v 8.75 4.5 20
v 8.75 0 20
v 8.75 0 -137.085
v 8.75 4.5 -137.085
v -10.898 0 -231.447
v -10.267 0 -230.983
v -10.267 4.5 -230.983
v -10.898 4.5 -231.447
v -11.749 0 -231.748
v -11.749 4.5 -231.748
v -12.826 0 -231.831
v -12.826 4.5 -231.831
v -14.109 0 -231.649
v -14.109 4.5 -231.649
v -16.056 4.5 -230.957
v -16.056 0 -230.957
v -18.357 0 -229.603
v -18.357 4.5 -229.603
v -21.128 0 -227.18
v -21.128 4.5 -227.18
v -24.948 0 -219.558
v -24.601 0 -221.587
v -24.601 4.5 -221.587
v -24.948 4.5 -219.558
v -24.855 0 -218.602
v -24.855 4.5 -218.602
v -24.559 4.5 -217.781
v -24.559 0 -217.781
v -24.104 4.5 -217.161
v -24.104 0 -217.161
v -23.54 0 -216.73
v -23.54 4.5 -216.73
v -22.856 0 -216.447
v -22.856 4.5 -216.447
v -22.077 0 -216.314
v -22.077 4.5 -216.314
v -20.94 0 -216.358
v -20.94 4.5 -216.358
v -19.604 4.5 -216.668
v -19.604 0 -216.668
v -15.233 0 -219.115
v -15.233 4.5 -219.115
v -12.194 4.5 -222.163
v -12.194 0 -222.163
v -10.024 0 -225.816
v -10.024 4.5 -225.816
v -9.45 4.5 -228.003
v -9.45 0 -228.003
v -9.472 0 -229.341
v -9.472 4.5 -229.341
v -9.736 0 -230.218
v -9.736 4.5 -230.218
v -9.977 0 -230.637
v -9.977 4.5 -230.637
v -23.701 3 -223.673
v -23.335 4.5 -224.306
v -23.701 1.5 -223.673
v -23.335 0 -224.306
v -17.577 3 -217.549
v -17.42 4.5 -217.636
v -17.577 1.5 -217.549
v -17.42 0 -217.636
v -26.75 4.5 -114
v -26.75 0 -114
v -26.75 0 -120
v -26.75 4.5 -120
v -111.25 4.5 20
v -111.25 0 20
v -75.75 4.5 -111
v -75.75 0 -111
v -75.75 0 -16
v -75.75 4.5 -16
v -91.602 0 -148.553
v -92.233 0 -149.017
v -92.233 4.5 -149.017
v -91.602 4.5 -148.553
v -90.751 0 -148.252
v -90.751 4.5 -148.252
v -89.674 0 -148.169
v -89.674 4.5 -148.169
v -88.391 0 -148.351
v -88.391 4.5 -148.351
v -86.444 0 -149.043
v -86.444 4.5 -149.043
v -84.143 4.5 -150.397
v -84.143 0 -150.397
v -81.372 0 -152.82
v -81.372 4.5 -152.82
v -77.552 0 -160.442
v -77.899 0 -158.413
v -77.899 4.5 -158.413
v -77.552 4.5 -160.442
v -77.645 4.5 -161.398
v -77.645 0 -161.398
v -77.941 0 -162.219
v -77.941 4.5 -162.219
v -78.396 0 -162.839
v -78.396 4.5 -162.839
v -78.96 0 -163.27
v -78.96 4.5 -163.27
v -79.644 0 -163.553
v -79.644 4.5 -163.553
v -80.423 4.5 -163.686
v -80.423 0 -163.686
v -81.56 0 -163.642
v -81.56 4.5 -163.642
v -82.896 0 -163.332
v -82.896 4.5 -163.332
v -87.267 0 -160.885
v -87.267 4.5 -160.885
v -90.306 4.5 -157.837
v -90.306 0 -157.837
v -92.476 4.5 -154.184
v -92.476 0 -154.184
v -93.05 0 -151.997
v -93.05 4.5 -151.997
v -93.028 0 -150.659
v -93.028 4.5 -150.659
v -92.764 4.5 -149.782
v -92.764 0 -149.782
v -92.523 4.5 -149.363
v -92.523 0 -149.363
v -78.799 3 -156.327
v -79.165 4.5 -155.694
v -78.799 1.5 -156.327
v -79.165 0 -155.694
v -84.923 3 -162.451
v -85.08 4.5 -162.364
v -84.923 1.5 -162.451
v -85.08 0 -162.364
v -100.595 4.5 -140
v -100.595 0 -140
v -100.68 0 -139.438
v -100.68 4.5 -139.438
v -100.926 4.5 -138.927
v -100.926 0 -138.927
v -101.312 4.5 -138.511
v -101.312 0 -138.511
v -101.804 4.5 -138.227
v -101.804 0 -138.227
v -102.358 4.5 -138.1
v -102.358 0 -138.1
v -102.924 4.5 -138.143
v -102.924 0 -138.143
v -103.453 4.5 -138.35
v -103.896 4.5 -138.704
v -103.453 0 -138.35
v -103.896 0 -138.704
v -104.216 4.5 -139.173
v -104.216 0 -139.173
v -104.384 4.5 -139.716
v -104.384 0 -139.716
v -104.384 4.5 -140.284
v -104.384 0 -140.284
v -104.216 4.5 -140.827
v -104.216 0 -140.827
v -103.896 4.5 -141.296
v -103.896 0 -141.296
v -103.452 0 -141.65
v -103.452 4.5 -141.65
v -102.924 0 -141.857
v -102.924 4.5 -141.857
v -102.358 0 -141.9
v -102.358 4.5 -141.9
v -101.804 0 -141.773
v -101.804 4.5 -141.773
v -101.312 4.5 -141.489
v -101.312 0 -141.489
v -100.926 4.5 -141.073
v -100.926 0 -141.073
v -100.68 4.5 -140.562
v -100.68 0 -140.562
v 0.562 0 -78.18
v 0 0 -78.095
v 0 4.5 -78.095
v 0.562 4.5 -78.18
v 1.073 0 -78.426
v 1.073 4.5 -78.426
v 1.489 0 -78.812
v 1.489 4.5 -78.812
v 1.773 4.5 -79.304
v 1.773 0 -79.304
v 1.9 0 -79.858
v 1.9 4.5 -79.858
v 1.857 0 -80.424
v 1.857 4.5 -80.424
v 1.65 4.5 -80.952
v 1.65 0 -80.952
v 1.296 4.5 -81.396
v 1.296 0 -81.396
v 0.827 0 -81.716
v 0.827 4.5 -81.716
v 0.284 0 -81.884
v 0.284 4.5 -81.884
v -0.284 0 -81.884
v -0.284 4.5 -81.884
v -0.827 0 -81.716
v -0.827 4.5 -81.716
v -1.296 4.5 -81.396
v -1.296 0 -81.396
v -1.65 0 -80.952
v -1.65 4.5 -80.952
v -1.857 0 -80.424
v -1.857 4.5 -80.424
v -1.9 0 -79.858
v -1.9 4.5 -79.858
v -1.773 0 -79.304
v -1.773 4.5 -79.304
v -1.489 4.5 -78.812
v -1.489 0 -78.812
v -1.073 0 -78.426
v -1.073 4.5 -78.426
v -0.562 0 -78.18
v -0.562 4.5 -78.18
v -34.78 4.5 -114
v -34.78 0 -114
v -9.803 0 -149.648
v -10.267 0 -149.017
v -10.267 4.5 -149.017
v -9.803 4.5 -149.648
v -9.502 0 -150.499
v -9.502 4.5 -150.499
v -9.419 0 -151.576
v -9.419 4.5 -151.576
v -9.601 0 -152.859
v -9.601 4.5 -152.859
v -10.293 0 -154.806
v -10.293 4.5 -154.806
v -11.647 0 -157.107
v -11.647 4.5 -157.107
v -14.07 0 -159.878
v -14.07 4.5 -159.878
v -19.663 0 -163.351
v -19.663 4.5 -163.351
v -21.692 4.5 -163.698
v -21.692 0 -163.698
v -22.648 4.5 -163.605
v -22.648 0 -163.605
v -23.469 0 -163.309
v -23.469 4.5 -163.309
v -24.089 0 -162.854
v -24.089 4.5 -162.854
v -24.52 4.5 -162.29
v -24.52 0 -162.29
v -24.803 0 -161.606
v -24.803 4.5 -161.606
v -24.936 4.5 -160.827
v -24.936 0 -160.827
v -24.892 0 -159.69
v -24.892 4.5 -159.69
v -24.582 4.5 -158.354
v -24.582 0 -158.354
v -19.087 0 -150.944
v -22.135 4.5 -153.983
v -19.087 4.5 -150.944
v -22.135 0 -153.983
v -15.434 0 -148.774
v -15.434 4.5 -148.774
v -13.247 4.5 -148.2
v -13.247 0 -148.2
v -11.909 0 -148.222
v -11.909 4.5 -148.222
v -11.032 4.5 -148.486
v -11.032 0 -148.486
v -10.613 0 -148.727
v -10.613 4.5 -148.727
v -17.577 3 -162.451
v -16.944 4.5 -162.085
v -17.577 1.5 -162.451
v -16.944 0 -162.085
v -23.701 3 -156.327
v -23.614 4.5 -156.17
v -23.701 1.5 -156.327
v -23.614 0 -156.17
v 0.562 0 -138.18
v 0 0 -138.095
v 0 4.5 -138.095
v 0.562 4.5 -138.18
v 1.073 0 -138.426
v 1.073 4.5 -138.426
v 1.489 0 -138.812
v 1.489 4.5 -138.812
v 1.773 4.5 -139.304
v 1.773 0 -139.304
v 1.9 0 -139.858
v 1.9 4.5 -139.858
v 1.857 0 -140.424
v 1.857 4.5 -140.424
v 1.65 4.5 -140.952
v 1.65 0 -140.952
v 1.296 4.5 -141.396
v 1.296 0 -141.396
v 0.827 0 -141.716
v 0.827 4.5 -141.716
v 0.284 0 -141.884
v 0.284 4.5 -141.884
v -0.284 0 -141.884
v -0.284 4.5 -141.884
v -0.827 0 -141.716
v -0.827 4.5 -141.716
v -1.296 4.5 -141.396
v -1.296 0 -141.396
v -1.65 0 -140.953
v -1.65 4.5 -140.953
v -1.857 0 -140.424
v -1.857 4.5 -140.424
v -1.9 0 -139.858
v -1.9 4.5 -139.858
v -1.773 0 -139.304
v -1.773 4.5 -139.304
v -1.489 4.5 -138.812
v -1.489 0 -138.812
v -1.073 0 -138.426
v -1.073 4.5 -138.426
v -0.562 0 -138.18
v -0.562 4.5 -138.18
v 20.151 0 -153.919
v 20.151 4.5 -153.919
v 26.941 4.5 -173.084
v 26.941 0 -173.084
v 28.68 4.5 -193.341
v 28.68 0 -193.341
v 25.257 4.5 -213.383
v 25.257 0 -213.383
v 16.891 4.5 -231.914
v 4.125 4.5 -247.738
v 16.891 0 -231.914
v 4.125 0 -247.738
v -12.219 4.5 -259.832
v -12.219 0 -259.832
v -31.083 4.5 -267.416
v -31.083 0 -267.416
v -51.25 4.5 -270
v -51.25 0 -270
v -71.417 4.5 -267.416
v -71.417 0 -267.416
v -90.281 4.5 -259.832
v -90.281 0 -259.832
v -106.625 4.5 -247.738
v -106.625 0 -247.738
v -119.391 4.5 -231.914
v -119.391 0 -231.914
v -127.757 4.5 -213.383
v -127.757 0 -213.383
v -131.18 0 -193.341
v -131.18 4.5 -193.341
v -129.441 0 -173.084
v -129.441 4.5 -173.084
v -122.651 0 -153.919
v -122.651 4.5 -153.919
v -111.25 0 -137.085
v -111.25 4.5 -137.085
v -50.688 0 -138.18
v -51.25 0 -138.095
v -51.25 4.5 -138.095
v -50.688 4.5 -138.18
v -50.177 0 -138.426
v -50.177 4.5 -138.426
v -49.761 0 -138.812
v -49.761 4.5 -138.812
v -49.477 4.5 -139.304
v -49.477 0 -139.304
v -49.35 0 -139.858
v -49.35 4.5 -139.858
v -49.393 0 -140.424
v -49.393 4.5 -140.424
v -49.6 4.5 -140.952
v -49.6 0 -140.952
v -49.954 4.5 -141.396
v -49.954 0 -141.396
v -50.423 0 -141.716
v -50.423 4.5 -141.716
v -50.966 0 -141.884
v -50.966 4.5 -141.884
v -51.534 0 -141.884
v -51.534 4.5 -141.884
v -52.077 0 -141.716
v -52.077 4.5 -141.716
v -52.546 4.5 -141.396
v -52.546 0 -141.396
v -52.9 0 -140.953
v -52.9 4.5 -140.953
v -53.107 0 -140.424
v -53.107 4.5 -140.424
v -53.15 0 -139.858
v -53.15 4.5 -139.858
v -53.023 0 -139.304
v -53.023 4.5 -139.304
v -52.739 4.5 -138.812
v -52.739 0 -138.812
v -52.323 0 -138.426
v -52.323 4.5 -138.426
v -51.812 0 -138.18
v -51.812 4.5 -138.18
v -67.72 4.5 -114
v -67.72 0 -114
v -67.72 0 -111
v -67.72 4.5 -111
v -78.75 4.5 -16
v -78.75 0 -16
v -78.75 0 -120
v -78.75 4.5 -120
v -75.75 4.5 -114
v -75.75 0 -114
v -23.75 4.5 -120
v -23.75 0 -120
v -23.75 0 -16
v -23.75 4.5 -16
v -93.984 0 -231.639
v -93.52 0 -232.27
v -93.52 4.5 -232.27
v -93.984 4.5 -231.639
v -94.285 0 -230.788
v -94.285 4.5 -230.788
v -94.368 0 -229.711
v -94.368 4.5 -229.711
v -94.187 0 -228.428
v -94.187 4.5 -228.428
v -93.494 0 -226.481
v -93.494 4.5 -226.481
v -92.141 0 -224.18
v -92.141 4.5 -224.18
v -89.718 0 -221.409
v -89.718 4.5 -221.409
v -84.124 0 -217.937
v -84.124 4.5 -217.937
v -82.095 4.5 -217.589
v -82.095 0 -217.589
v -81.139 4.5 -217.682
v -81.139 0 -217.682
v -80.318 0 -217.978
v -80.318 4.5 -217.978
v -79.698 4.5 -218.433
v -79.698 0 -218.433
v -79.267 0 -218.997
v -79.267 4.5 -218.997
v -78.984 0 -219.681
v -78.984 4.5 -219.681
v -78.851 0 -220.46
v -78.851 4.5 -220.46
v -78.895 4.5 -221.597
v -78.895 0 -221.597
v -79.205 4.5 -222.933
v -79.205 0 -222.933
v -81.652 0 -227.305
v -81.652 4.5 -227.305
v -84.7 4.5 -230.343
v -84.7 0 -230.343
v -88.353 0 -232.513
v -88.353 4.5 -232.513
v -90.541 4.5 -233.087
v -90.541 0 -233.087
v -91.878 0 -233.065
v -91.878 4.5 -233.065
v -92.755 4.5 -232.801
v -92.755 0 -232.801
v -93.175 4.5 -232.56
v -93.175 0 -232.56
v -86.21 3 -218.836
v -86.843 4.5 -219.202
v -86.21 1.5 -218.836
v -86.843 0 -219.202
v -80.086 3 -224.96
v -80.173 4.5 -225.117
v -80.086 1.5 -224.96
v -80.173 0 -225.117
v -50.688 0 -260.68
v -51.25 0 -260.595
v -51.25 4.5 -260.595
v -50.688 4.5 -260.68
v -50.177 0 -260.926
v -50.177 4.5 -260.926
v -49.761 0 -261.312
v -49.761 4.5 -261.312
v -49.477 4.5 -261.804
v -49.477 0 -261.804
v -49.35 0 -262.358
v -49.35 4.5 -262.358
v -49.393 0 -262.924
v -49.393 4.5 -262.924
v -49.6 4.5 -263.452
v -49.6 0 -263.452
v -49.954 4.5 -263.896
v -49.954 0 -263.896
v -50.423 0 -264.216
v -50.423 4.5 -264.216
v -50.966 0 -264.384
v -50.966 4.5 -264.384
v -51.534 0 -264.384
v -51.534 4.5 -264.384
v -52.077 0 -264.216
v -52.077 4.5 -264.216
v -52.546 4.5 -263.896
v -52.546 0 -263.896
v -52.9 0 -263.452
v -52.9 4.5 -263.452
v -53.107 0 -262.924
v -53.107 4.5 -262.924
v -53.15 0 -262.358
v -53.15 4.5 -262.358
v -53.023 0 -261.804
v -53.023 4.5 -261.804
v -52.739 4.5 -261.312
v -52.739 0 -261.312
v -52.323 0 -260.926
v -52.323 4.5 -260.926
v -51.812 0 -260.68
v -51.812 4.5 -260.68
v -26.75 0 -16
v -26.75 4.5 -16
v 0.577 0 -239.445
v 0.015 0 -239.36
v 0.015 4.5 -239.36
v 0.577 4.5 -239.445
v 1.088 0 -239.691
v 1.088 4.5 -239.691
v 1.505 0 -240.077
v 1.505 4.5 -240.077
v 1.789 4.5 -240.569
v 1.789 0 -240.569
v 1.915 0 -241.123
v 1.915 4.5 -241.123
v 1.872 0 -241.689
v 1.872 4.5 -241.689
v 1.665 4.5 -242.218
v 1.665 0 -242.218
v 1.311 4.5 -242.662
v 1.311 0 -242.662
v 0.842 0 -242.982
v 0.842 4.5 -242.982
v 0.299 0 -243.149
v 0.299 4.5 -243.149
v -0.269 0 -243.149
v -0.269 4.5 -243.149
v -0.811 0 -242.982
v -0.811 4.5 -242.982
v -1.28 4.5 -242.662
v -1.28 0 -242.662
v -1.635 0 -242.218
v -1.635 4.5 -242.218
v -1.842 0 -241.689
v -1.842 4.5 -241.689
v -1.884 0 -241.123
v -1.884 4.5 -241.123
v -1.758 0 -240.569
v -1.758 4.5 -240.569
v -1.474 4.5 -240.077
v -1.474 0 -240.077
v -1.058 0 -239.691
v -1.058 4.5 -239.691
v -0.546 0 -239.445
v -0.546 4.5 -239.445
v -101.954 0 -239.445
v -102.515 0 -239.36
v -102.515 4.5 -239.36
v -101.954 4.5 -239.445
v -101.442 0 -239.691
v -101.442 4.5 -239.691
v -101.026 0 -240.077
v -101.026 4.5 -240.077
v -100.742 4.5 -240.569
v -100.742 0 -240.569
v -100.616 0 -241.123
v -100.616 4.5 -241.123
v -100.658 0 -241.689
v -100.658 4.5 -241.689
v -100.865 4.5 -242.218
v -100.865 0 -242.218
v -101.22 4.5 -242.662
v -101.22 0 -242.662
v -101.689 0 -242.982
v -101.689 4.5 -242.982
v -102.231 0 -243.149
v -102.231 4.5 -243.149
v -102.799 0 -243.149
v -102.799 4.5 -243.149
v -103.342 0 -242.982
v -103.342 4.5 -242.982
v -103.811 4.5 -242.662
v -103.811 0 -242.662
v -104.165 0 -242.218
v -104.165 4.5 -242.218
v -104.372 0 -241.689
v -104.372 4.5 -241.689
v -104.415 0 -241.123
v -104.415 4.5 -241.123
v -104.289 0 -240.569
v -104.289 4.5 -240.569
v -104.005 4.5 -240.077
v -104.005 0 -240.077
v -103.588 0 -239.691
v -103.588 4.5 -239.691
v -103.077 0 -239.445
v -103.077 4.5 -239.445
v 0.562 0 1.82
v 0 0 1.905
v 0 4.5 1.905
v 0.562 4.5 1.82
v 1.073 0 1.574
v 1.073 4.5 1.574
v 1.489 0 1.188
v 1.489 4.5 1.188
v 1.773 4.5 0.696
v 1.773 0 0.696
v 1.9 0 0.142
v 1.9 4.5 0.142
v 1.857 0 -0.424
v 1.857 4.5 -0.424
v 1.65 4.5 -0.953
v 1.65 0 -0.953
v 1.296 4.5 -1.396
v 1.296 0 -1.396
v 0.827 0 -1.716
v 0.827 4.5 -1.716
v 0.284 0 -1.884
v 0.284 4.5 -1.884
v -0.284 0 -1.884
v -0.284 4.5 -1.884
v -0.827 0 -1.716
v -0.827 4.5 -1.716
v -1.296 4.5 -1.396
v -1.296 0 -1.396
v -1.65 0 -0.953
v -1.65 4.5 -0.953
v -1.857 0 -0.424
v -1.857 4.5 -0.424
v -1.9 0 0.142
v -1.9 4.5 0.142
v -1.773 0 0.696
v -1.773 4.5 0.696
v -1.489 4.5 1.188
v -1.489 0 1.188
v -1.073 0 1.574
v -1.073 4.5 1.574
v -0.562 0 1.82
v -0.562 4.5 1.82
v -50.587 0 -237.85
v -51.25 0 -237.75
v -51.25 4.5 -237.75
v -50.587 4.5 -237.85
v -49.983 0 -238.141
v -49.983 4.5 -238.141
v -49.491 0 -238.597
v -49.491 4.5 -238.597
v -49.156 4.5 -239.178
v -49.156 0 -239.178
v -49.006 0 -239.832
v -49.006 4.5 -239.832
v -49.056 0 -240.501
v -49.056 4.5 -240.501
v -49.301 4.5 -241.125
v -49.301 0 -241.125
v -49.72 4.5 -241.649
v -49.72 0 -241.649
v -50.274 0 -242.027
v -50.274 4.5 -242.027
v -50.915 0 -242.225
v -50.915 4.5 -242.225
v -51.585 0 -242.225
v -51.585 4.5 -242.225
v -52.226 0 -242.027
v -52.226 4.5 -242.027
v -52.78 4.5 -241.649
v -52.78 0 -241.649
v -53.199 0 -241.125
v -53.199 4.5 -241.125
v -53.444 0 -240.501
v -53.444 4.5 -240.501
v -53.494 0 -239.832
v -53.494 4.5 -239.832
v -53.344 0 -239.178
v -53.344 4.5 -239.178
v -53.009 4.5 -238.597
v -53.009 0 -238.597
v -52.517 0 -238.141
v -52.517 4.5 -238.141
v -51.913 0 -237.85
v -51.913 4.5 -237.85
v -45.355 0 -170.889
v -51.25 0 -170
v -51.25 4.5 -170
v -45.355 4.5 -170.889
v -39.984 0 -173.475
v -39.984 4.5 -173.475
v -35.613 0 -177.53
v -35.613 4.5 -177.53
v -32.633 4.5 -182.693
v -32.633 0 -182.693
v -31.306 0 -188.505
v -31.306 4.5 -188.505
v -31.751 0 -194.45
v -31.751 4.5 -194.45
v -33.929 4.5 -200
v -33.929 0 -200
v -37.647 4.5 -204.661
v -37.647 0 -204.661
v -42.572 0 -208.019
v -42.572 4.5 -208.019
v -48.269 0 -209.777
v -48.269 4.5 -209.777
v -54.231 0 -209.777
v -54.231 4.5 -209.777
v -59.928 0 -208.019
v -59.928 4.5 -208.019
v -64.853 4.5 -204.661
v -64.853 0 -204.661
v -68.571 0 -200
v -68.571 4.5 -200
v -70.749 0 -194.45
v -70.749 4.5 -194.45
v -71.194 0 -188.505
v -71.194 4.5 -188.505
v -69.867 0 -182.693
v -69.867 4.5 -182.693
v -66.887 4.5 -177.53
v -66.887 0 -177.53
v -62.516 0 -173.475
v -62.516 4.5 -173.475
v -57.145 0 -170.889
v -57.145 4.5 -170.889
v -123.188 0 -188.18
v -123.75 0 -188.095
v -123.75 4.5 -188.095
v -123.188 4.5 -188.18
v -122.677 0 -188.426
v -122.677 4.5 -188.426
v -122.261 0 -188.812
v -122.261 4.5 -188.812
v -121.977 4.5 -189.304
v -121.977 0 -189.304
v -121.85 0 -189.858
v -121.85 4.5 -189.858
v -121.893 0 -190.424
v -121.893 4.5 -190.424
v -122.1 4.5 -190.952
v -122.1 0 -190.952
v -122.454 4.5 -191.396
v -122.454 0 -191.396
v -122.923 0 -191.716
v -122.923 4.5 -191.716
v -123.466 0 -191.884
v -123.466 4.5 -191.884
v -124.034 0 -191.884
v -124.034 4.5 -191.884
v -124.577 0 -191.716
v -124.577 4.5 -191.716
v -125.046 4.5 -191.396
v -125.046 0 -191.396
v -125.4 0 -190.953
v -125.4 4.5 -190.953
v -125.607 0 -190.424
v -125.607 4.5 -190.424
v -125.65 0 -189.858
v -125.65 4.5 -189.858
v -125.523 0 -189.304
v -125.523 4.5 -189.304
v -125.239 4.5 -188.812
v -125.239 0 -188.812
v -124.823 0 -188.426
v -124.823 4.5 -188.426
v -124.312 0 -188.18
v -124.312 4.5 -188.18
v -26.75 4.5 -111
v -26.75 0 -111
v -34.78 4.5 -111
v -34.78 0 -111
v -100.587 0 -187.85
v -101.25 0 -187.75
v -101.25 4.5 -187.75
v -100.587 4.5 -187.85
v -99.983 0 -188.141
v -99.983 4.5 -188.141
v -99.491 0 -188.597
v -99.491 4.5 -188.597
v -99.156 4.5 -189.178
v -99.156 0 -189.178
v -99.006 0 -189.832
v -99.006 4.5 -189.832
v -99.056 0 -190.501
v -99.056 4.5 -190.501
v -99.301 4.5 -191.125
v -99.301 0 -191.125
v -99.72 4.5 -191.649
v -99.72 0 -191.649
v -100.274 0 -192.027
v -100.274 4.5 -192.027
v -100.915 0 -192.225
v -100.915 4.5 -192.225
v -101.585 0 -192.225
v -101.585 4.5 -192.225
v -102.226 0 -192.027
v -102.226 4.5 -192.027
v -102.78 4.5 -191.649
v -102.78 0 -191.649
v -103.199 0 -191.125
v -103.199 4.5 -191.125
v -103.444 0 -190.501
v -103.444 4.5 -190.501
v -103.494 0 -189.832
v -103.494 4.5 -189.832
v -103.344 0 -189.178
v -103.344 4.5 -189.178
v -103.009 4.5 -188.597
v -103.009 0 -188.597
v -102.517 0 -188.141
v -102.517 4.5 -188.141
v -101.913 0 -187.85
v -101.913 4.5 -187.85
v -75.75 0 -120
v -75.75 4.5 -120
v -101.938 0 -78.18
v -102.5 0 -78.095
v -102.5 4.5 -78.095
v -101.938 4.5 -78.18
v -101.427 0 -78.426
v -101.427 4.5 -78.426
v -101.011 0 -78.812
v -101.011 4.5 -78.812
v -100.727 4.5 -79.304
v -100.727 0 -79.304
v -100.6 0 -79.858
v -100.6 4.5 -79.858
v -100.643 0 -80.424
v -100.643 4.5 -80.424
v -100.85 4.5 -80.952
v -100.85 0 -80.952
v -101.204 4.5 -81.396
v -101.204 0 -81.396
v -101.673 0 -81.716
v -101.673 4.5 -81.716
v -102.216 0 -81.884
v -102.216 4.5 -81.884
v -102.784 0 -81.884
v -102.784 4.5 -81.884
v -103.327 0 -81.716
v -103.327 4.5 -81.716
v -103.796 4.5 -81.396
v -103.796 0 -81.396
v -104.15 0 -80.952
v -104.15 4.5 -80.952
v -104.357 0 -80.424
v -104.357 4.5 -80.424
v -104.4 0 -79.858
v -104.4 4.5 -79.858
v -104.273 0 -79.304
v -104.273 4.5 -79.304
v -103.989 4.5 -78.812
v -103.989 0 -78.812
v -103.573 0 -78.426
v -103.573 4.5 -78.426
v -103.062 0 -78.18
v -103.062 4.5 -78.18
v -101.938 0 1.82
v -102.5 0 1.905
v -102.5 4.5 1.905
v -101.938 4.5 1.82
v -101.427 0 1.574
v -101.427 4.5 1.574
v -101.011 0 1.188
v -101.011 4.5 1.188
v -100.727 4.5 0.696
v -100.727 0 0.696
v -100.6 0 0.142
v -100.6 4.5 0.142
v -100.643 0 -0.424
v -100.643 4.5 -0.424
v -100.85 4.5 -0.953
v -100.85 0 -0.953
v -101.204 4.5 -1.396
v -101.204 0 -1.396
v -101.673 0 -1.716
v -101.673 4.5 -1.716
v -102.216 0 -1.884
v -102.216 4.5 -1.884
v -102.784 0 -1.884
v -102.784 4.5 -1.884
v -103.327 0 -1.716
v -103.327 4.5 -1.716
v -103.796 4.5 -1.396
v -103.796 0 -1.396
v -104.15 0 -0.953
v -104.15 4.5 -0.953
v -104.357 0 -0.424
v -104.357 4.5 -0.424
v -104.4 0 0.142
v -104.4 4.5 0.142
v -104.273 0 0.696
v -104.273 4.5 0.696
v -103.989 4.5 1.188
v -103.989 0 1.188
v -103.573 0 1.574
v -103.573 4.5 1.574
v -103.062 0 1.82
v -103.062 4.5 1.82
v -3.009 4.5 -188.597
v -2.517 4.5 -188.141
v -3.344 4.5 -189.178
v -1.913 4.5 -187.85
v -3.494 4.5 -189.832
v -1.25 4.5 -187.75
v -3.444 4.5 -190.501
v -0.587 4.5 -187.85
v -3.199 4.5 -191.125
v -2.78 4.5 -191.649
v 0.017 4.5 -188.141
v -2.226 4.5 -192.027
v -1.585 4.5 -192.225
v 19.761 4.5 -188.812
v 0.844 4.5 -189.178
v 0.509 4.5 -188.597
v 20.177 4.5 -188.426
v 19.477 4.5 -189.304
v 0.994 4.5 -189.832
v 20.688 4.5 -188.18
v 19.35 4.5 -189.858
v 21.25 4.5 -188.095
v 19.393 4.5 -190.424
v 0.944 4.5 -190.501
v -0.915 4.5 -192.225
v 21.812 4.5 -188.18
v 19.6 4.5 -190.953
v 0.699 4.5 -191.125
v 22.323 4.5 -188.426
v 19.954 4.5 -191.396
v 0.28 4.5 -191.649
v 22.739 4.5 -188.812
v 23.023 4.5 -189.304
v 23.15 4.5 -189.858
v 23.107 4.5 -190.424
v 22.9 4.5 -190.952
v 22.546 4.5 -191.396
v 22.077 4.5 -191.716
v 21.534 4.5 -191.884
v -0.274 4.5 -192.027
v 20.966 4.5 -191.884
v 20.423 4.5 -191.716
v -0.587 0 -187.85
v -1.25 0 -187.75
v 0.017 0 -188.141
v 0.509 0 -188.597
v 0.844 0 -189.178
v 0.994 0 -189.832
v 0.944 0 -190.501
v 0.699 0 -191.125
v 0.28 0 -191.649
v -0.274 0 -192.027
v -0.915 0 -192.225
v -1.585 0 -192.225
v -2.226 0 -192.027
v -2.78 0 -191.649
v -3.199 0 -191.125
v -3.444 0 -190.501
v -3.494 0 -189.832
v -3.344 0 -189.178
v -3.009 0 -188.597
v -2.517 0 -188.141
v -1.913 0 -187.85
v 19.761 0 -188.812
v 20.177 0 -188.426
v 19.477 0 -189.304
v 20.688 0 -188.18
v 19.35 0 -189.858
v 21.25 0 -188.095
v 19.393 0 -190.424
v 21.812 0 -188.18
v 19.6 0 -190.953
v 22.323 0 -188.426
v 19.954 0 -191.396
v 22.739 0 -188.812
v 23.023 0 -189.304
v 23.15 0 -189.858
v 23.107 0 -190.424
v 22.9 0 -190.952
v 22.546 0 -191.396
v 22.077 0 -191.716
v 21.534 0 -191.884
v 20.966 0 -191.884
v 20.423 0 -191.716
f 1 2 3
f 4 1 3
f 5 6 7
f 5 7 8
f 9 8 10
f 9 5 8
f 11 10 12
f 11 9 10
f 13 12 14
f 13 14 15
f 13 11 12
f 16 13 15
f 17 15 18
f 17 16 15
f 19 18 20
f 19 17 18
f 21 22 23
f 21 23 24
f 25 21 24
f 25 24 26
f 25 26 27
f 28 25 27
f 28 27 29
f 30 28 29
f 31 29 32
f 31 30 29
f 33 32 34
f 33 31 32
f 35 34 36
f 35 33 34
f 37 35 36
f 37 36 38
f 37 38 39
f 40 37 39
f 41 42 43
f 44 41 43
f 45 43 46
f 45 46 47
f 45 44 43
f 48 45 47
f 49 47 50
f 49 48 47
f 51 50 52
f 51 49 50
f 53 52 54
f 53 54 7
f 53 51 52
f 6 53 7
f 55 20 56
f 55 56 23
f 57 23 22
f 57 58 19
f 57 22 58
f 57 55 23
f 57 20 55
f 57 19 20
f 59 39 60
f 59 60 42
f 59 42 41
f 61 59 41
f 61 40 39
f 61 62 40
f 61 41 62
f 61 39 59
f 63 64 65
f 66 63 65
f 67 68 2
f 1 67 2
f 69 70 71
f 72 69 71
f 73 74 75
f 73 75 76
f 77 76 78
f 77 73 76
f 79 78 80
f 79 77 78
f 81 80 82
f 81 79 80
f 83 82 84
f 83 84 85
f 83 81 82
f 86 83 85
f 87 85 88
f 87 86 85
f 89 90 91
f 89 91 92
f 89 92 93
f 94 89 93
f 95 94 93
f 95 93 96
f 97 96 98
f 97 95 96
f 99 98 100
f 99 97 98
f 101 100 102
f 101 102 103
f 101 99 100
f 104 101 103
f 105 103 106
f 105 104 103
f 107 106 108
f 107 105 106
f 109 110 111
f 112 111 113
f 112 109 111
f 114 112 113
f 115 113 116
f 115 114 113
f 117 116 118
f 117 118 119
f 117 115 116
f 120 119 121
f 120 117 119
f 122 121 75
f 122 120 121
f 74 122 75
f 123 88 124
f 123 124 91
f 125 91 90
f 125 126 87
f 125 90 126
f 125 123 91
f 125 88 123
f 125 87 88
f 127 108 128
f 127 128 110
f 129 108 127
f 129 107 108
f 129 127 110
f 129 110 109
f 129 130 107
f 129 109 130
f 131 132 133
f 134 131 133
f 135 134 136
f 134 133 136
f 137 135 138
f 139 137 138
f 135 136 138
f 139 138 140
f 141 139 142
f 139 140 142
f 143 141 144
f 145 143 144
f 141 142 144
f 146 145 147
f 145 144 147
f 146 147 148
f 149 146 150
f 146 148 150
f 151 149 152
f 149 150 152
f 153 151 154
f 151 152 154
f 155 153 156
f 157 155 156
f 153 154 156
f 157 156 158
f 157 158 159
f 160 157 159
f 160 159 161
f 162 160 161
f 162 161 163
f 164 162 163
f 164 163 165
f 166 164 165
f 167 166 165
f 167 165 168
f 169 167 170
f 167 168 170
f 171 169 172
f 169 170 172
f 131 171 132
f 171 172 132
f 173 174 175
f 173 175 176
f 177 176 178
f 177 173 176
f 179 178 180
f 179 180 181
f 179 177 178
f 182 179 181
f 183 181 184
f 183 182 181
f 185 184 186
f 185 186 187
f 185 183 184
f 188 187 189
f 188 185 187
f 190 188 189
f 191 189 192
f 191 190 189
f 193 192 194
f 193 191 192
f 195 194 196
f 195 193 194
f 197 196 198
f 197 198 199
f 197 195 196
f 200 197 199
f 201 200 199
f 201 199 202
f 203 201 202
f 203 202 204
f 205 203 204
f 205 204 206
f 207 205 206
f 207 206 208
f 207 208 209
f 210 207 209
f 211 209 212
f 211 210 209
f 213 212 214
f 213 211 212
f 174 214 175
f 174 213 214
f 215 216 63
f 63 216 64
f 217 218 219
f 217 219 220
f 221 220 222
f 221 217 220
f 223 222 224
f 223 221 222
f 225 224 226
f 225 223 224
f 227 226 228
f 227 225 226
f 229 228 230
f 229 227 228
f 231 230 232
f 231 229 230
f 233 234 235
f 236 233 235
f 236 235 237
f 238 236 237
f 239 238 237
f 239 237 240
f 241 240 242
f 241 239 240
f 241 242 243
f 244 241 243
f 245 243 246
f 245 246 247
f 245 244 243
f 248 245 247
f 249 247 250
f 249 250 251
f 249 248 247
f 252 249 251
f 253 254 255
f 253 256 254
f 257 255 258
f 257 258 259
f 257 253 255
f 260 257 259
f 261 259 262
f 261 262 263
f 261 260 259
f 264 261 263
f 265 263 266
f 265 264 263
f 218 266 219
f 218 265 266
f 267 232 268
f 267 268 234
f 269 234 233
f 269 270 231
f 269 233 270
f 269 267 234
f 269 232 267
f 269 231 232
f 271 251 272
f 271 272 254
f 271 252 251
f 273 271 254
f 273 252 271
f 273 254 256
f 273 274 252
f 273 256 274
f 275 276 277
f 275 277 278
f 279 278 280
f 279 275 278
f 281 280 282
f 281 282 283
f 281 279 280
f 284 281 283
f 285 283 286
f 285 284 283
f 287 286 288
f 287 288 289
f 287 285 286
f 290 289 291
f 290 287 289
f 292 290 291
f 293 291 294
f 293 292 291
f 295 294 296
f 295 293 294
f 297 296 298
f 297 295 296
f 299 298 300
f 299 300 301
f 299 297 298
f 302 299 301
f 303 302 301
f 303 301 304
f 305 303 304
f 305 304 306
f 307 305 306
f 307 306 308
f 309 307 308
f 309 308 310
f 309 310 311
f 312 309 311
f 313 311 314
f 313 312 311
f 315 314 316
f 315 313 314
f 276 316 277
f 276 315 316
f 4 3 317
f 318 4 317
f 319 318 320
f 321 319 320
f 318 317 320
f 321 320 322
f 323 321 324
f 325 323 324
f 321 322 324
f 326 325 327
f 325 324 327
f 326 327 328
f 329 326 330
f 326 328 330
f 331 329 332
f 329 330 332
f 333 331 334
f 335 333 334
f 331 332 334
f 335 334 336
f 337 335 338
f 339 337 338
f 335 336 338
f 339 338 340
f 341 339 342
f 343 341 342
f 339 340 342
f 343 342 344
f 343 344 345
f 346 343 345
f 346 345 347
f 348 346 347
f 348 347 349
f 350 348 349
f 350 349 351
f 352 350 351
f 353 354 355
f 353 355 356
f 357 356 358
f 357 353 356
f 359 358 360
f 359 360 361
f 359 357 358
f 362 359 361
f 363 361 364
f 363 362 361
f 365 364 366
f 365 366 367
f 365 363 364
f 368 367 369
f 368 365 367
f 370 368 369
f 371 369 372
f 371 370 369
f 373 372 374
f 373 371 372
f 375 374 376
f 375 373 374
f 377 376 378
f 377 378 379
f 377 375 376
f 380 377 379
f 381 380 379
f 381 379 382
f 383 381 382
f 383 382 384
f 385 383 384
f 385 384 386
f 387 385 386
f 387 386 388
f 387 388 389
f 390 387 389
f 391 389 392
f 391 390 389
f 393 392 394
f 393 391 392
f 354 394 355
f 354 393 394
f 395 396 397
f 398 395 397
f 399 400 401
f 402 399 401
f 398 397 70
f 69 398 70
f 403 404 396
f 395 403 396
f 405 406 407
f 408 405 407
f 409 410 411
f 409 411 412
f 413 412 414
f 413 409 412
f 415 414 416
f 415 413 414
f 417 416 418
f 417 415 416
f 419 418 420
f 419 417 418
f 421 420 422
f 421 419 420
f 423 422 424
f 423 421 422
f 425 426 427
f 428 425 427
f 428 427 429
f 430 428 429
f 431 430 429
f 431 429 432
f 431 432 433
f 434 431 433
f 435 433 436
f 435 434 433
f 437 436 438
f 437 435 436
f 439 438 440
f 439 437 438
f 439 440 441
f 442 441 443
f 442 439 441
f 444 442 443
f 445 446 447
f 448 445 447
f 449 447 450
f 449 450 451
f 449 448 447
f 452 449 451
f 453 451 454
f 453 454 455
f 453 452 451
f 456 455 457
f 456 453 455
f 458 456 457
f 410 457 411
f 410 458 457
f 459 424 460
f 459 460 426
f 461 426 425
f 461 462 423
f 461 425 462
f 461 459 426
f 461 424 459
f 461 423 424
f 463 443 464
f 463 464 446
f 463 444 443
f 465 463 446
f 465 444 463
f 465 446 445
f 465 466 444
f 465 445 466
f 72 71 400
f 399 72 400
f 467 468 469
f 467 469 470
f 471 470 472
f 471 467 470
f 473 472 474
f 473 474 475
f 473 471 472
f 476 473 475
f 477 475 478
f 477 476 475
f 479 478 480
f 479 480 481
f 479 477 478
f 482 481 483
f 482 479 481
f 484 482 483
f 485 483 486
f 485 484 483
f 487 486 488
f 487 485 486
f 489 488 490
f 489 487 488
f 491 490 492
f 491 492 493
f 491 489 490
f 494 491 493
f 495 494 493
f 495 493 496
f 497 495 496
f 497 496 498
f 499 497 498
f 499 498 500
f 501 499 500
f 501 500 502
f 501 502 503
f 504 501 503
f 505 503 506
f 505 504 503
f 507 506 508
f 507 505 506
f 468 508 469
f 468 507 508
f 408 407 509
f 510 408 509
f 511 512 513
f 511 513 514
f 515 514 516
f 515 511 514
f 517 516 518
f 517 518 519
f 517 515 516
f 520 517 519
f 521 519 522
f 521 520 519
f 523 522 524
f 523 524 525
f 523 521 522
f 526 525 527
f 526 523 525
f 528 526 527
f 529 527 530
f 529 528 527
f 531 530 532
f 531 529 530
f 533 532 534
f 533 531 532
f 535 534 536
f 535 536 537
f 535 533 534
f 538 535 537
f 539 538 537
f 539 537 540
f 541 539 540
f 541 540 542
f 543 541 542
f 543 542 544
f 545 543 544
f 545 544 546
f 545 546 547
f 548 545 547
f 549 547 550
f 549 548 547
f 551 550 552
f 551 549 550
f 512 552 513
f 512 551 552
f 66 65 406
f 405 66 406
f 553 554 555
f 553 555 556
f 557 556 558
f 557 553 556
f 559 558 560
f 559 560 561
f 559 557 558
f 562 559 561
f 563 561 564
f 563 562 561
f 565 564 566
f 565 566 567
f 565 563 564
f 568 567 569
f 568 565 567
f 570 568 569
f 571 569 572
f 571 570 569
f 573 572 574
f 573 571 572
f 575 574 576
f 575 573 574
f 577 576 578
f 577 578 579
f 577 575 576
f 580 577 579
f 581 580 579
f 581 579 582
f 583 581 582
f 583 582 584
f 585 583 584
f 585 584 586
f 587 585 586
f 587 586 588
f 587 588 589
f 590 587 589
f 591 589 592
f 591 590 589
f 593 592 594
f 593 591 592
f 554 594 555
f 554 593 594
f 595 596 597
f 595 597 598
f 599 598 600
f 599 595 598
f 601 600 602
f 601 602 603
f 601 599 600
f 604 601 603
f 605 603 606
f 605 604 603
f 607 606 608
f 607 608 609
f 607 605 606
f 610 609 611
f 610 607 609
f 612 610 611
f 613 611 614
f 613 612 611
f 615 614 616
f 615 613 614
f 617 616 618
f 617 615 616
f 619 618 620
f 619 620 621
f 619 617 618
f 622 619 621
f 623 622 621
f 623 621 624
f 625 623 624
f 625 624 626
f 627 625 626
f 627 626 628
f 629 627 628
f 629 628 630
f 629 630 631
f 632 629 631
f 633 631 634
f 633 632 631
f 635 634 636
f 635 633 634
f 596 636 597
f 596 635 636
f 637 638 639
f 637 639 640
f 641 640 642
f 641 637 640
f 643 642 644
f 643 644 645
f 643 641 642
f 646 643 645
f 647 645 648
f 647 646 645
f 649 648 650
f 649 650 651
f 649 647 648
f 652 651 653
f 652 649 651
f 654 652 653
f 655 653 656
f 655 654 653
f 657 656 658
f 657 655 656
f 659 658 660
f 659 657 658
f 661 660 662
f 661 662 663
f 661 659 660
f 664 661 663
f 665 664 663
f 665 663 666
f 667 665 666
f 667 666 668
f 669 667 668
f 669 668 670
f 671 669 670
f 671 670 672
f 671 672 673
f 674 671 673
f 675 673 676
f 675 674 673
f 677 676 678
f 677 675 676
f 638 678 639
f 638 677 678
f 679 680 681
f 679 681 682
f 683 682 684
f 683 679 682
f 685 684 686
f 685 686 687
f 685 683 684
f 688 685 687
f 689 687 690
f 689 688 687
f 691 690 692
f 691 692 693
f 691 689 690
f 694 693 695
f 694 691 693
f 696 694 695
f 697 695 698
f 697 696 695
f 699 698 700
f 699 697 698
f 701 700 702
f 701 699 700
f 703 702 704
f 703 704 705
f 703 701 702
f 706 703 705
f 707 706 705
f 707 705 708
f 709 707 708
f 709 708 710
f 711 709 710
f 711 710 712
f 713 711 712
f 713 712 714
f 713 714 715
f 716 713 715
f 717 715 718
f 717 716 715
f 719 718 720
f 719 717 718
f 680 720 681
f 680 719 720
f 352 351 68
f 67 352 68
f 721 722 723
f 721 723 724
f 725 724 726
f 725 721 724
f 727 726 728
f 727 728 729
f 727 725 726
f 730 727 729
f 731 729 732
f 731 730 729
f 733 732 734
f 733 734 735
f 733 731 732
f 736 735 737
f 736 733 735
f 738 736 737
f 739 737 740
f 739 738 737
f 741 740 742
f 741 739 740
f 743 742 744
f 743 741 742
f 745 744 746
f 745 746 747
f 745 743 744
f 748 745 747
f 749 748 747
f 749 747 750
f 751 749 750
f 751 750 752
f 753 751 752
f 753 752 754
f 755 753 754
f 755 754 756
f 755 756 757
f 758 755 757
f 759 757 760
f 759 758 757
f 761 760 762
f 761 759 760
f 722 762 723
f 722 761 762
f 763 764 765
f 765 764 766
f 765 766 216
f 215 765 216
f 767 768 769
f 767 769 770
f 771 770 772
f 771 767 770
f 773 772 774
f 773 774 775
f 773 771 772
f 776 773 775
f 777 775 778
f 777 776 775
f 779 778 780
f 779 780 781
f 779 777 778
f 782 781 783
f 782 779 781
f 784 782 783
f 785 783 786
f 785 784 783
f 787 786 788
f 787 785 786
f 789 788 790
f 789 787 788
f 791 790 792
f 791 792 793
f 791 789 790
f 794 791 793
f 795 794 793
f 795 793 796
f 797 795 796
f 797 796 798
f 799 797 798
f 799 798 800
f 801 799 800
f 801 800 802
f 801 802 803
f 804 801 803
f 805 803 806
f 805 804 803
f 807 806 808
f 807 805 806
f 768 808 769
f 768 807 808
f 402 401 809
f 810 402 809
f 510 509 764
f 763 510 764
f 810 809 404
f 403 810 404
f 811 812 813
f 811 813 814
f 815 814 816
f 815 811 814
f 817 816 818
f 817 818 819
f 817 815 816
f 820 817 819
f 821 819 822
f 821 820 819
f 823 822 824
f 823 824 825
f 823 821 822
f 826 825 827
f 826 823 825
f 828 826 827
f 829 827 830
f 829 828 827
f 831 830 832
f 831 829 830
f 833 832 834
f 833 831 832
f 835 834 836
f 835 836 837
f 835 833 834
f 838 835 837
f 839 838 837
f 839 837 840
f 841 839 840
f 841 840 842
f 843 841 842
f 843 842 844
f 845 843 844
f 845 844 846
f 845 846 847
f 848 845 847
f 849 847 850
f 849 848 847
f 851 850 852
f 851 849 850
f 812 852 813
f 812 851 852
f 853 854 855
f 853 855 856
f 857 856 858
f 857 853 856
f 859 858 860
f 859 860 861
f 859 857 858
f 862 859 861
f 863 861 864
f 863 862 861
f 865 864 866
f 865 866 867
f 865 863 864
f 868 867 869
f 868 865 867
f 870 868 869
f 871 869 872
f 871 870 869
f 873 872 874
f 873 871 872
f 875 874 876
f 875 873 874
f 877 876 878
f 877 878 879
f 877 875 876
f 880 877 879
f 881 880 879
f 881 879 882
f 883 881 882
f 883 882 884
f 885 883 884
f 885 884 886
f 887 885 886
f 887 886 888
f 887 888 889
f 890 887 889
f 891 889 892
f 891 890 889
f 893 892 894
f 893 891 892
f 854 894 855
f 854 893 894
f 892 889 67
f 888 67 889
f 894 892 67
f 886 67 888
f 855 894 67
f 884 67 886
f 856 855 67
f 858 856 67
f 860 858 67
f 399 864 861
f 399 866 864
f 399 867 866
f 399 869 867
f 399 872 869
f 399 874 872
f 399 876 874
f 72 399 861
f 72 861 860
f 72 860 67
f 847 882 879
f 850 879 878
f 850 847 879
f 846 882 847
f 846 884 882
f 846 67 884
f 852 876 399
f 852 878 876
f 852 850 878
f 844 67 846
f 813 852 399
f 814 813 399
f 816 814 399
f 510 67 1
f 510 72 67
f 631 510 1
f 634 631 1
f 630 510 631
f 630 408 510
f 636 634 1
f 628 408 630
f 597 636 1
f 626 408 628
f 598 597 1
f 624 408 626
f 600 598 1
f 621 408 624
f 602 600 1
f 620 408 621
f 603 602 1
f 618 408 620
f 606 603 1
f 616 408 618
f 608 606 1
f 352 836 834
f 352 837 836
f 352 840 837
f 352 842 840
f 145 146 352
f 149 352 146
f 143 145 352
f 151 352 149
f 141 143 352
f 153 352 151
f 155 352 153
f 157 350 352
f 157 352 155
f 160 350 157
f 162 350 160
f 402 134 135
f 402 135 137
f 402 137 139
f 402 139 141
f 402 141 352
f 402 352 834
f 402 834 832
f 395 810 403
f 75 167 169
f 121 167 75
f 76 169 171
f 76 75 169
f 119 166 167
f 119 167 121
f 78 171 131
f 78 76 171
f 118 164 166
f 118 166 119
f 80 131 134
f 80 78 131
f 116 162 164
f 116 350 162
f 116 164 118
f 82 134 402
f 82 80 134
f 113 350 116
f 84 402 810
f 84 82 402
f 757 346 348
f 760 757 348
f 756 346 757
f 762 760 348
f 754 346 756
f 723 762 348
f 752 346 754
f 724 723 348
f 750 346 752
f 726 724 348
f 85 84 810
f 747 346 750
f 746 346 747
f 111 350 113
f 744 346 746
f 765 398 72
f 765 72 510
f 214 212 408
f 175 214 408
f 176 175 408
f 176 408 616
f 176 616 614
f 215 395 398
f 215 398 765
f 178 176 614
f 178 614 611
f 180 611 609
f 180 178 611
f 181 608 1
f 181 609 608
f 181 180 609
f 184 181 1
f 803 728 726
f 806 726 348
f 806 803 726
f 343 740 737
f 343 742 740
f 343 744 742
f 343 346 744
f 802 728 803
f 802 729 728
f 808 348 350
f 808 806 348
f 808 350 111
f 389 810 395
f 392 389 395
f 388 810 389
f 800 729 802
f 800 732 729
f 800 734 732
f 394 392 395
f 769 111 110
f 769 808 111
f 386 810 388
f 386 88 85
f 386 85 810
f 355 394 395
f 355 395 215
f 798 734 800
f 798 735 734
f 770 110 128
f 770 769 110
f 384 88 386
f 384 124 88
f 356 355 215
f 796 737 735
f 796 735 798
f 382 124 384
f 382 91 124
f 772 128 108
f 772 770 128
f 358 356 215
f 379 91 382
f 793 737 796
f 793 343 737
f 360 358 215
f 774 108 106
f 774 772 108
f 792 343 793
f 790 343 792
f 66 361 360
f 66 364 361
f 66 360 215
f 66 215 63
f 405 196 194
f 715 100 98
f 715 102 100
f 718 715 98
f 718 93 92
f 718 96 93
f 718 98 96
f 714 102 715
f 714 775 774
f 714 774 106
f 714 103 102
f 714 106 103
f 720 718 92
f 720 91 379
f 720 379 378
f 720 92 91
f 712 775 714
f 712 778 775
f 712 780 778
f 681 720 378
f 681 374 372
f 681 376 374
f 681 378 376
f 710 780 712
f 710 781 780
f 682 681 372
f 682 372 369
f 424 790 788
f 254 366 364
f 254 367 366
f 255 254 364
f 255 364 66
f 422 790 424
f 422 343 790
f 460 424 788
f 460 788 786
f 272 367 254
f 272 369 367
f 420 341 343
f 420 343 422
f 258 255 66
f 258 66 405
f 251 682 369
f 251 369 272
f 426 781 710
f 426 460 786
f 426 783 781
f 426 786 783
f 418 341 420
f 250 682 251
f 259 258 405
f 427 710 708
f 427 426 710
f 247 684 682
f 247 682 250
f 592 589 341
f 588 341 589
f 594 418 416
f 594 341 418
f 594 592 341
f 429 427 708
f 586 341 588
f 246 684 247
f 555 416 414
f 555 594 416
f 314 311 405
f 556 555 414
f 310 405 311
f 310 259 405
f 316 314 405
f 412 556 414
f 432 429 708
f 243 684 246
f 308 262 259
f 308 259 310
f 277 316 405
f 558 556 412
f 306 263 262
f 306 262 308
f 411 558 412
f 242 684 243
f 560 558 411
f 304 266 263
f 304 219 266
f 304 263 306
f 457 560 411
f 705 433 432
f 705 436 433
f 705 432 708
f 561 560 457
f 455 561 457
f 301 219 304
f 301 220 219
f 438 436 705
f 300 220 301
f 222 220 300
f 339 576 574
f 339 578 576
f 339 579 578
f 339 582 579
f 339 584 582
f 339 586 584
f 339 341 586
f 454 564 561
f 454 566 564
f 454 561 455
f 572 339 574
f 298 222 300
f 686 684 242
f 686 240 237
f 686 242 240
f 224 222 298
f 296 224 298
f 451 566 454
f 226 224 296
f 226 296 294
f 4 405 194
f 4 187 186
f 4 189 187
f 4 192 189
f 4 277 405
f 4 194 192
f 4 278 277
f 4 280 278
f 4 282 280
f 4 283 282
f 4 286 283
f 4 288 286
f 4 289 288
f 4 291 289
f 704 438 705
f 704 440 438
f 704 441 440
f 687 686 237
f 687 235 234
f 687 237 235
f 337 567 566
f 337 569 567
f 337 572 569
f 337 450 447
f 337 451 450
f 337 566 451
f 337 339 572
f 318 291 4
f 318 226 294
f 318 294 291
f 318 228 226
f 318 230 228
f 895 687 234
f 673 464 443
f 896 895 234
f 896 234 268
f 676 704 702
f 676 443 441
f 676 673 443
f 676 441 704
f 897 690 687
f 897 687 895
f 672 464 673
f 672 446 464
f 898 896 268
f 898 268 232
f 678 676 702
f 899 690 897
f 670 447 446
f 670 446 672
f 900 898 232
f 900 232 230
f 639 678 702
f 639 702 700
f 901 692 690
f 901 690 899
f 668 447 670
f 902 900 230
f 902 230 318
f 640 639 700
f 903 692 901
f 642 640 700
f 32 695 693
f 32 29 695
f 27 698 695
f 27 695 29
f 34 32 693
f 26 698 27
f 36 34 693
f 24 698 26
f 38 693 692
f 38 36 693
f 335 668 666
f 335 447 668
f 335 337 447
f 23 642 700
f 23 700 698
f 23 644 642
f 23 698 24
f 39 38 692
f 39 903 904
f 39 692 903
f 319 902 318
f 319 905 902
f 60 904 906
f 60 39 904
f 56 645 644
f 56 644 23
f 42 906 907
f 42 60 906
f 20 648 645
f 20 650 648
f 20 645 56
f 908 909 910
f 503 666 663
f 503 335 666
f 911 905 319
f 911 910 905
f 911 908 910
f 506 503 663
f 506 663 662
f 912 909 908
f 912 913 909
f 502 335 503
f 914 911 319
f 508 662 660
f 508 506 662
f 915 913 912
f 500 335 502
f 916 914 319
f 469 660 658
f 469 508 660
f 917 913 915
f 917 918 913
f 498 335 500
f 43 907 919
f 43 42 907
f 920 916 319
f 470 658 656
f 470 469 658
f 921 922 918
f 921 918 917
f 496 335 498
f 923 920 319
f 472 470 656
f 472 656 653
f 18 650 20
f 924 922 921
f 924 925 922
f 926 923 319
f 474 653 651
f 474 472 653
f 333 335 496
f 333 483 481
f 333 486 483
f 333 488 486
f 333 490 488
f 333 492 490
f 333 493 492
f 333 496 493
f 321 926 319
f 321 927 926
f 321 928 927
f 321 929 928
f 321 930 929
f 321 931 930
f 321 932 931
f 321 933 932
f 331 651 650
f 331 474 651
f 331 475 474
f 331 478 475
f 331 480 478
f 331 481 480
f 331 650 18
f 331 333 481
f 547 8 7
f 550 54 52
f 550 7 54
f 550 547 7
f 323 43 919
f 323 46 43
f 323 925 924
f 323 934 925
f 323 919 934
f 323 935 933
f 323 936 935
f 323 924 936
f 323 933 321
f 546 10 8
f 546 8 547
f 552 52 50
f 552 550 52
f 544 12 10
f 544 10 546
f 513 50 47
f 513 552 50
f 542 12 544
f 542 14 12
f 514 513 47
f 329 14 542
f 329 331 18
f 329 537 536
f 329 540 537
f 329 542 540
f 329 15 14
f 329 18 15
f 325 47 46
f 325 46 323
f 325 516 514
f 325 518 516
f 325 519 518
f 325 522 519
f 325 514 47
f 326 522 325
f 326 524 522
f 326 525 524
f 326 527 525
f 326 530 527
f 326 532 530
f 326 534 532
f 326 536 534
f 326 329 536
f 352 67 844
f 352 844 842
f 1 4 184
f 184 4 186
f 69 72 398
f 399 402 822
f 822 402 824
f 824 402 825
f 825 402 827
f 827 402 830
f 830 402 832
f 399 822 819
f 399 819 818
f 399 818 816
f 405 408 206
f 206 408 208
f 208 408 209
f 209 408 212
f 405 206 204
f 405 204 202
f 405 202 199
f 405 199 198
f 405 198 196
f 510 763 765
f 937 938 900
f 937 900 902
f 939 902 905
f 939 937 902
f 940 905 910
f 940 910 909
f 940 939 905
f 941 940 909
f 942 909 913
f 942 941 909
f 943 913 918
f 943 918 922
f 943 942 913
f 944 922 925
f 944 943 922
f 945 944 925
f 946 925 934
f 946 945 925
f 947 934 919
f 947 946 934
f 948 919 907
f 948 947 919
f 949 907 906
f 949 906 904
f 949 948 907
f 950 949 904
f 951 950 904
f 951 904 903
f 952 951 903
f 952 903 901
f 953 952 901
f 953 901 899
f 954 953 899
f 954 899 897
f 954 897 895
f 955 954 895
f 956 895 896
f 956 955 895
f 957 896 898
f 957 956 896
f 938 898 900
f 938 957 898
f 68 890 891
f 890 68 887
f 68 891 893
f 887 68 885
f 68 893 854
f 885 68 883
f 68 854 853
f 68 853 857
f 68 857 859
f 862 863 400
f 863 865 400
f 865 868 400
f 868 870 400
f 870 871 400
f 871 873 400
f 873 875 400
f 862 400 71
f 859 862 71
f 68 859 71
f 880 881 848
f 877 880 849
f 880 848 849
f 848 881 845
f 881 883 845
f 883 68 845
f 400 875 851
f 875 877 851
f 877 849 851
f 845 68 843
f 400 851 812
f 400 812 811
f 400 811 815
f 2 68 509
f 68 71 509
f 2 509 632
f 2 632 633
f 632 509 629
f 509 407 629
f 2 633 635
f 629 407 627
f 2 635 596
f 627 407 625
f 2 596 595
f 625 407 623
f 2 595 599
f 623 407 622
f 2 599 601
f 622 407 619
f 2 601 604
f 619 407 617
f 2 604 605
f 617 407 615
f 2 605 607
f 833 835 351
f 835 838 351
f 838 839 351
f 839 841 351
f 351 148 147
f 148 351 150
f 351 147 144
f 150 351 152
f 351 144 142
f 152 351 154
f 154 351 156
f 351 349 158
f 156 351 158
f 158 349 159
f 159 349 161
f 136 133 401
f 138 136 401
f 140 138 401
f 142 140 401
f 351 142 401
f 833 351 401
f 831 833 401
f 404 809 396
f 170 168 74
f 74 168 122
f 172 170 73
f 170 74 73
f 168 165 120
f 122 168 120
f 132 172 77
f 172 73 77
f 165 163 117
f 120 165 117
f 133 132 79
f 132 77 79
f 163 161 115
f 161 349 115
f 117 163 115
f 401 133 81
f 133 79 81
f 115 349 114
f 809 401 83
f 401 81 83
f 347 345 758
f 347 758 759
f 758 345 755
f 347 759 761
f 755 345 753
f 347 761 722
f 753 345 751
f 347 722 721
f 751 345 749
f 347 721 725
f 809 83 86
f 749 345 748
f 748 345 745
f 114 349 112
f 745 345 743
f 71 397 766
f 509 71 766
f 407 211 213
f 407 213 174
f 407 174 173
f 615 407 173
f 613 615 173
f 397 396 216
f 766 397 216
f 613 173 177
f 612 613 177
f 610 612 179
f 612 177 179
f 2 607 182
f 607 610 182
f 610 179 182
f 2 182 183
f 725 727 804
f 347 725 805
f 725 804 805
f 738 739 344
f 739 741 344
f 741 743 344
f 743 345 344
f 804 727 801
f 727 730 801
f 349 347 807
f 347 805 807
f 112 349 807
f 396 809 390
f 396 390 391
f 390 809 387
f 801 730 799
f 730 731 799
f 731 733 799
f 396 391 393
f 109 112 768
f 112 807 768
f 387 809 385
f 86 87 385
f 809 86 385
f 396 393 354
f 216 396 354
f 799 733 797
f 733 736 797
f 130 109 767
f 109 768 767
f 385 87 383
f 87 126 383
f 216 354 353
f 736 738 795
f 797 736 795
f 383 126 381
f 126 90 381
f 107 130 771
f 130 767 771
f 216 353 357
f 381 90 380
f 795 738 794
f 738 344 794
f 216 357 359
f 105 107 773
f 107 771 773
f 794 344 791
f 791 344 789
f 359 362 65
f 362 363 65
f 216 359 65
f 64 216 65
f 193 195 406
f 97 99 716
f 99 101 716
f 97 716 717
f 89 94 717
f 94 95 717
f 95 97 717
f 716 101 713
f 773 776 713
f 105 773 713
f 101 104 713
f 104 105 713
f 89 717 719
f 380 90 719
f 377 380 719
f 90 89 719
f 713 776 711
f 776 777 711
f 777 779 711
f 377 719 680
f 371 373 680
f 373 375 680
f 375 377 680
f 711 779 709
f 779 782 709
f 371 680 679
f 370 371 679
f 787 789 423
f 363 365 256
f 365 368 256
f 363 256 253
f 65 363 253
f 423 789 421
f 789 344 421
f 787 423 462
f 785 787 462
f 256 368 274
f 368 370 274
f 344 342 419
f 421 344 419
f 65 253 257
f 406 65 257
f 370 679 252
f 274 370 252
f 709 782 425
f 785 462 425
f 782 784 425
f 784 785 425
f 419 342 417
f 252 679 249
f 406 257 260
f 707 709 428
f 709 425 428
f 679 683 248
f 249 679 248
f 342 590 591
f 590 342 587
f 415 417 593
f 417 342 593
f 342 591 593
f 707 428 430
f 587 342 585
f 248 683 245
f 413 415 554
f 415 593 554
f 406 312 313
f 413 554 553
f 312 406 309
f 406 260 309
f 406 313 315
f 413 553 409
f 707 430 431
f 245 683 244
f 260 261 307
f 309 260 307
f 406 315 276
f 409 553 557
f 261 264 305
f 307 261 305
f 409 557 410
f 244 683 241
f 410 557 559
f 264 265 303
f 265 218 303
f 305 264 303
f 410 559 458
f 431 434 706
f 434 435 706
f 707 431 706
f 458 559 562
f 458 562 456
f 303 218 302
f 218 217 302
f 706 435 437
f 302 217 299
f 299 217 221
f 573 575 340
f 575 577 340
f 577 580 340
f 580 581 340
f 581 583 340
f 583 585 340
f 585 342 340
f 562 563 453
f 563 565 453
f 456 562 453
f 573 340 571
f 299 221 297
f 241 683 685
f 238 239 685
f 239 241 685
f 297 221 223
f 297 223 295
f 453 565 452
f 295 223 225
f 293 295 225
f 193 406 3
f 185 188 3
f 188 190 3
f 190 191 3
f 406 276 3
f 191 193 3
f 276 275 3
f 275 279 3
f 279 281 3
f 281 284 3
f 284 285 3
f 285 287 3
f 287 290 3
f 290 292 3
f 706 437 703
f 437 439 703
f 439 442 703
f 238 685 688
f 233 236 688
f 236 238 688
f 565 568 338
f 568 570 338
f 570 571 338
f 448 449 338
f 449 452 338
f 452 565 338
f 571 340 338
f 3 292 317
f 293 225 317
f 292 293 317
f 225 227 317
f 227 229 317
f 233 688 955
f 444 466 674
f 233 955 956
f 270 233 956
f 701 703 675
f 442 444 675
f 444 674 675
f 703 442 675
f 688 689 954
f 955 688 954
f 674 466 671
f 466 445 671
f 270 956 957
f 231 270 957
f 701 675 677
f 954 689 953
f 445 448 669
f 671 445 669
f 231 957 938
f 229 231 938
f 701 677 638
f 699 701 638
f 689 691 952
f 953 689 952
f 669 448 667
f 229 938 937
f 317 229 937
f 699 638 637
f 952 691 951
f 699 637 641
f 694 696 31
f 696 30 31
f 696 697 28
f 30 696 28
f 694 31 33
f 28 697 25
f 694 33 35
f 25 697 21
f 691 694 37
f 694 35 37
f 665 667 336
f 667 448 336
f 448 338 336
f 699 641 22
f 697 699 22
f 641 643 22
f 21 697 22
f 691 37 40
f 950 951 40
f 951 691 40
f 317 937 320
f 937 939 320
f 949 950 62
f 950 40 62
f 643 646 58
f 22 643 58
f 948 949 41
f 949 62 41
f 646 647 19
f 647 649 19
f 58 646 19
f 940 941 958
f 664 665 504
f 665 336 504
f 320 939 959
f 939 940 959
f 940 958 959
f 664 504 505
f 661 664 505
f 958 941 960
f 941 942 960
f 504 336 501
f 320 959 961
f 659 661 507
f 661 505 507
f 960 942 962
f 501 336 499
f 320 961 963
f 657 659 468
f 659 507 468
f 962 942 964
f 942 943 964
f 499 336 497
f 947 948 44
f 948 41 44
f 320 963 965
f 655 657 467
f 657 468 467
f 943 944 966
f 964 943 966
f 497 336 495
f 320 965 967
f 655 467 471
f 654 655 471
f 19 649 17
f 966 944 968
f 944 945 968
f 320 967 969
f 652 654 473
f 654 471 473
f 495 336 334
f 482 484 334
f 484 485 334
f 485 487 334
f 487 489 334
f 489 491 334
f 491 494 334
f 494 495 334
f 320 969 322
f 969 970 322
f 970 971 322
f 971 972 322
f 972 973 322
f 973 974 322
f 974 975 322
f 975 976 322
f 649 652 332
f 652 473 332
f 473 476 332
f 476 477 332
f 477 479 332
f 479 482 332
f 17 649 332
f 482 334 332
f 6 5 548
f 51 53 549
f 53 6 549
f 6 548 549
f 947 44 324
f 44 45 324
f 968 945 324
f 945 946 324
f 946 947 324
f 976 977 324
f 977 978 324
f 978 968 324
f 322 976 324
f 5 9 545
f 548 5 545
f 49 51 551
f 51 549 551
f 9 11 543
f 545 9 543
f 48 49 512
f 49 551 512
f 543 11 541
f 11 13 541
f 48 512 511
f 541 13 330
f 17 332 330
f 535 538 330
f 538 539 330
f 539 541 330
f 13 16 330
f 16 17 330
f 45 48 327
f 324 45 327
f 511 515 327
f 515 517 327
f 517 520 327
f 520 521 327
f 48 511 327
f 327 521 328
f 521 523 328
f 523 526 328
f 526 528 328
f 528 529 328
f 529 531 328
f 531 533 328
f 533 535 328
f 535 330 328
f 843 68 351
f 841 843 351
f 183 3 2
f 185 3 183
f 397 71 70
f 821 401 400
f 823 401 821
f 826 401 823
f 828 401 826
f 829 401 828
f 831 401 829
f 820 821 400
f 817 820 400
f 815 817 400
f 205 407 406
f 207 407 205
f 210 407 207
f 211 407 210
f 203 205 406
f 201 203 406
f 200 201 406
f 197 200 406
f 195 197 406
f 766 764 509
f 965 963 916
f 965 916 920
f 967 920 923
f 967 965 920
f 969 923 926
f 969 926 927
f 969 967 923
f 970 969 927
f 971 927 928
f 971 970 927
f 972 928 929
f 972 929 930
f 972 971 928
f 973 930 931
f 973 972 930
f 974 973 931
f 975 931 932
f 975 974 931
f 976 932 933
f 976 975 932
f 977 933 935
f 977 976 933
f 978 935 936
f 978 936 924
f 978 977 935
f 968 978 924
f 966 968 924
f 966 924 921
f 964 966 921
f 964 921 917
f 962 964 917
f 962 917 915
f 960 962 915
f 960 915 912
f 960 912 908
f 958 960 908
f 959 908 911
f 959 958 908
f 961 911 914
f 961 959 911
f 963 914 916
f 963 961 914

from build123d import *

# Parameters (mm, degrees)
SKETCH1_R           = 1.905
SKETCH1_R_2         = 2.25
SKETCH1_R_3         = 20
BOSS_EXTRUDE1_DEPTH = 4.5


with BuildPart() as part:
    # Sketch1 → Boss-Extrude1 (new body)
    with BuildSketch(Plane(origin=(0, 0, 0), x_dir=(1, 0, 0), z_dir=(0, 1, 0))):
        with BuildLine():
            ThreePointArc((8.75, 137.084973779), (-51.25, 270), (-111.25, 137.084973779))
            Line((-111.25, 137.084973779), (-111.25, -20))
            Line((-111.25, -20), (8.75, -20))
            Line((8.75, -20), (8.75, 137.084973779))
        make_face()
        Polygon((-23.75, 120), (-23.75, 16), (-26.75, 16), (-26.75, 111), (-34.779961709, 111), (-34.779961709, 114), (-26.75, 114), (-26.75, 120), align=None, mode=Mode.SUBTRACT)
        Polygon((-67.720038291, 114), (-67.720038291, 111), (-75.75, 111), (-75.75, 16), (-78.75, 16), (-78.75, 120), (-75.75, 120), (-75.75, 114), align=None, mode=Mode.SUBTRACT)
        with BuildLine():
            ThreePointArc((-104.405, 140), (-102.5, 141.905), (-100.595, 140))
            ThreePointArc((-100.595, 140), (-102.5, 138.095), (-104.405, 140))
        make_face(mode=Mode.SUBTRACT)
        with Locations(Location((-51.25, 140, 0), (0, 0, 270))):
            Circle(SKETCH1_R, mode=Mode.SUBTRACT)
        with BuildLine():
            add(Edge.make_bspline(
                [(-92.232996185, 149.017003815), (-86.109271828, 142.893279458), (-78.798938187, 156.327337456), (-71.488604545, 169.761395455), (-84.922662544, 162.451061813), (-98.356720542, 155.140728172), (-92.232996185, 149.017003815)],
                knots=[0, 0, 0, 2.094395102, 2.094395102, 4.188790205, 4.188790205, 6.283185307, 6.283185307, 6.283185307], degree=2, weights=[1, 0.5, 1, 0.5, 1, 0.5, 1]))
        make_face(mode=Mode.SUBTRACT)
        with Locations(Location((-123.75, 190, 0), (0, 0, 270))):
            Circle(SKETCH1_R, mode=Mode.SUBTRACT)
        with Locations(Location((-101.25, 190, 0), (0, 0, 270))):
            Circle(SKETCH1_R_2, mode=Mode.SUBTRACT)
        with Locations(Location((-51.25, 190, 0), (0, 0, 270))):
            Circle(SKETCH1_R_3, mode=Mode.SUBTRACT)
        with BuildLine():
            add(Edge.make_bspline(
                [(-10.267003815, 149.017003815), (-4.143279458, 155.140728172), (-17.577337456, 162.451061813), (-31.011395455, 169.761395455), (-23.701061813, 156.327337456), (-16.390728172, 142.893279458), (-10.267003815, 149.017003815)],
                knots=[0, 0, 0, 2.094395102, 2.094395102, 4.188790205, 4.188790205, 6.283185307, 6.283185307, 6.283185307], degree=2, weights=[1, 0.5, 1, 0.5, 1, 0.5, 1]))
        make_face(mode=Mode.SUBTRACT)
        with Locations(Location((0, 140, 0), (0, 0, 270))):
            Circle(SKETCH1_R, mode=Mode.SUBTRACT)
        with Locations(Location((-1.25, 190, 0), (0, 0, 270))):
            Circle(SKETCH1_R_2, mode=Mode.SUBTRACT)
        with Locations(Location((21.25, 190, 0), (0, 0, 270))):
            Circle(SKETCH1_R, mode=Mode.SUBTRACT)
        with BuildLine():
            add(Edge.make_bspline(
                [(-93.520136273, 232.270136273), (-99.64386063, 226.146411916), (-86.209802631, 218.836078274), (-72.775744633, 211.525744633), (-80.086078274, 224.959802631), (-87.396411916, 238.39386063), (-93.520136273, 232.270136273)],
                knots=[0, 0, 0, 2.094395102, 2.094395102, 4.188790205, 4.188790205, 6.283185307, 6.283185307, 6.283185307], degree=2, weights=[1, 0.5, 1, 0.5, 1, 0.5, 1]))
        make_face(mode=Mode.SUBTRACT)
        with Locations(Location((-102.515241636, 241.265241636, 0), (0, 0, 270))):
            Circle(SKETCH1_R, mode=Mode.SUBTRACT)
        with Locations(Location((-51.25, 240, 0), (0, 0, 270))):
            Circle(SKETCH1_R_2, mode=Mode.SUBTRACT)
        with BuildLine():
            add(Edge.make_bspline(
                [(-10.267003815, 230.982996185), (-16.390728172, 237.106720542), (-23.701061813, 223.672662544), (-31.011395455, 210.238604545), (-17.577337456, 217.548938187), (-4.143279458, 224.859271828), (-10.267003815, 230.982996185)],
                knots=[0, 0, 0, 2.094395102, 2.094395102, 4.188790205, 4.188790205, 6.283185307, 6.283185307, 6.283185307], degree=2, weights=[1, 0.5, 1, 0.5, 1, 0.5, 1]))
        make_face(mode=Mode.SUBTRACT)
        with Locations(Location((-51.25, 262.5, 0), (0, 0, 270))):
            Circle(SKETCH1_R, mode=Mode.SUBTRACT)
        with Locations(Location((0.015241636, 241.265241636, 0), (0, 0, 270))):
            Circle(SKETCH1_R, mode=Mode.SUBTRACT)
        with Locations(Location((0, 80, 0), (0, 0, 270))):
            Circle(SKETCH1_R, mode=Mode.SUBTRACT)
        with Locations(Location((-102.5, 80, 0), (0, 0, 270))):
            Circle(SKETCH1_R, mode=Mode.SUBTRACT)
        with Locations(Location((0, 0, 0), (0, 0, 270))):
            Circle(SKETCH1_R, mode=Mode.SUBTRACT)
        with Locations(Location((-102.5, 0, 0), (0, 0, 270))):
            Circle(SKETCH1_R, mode=Mode.SUBTRACT)
    extrude(amount=BOSS_EXTRUDE1_DEPTH)


solid = part.part
